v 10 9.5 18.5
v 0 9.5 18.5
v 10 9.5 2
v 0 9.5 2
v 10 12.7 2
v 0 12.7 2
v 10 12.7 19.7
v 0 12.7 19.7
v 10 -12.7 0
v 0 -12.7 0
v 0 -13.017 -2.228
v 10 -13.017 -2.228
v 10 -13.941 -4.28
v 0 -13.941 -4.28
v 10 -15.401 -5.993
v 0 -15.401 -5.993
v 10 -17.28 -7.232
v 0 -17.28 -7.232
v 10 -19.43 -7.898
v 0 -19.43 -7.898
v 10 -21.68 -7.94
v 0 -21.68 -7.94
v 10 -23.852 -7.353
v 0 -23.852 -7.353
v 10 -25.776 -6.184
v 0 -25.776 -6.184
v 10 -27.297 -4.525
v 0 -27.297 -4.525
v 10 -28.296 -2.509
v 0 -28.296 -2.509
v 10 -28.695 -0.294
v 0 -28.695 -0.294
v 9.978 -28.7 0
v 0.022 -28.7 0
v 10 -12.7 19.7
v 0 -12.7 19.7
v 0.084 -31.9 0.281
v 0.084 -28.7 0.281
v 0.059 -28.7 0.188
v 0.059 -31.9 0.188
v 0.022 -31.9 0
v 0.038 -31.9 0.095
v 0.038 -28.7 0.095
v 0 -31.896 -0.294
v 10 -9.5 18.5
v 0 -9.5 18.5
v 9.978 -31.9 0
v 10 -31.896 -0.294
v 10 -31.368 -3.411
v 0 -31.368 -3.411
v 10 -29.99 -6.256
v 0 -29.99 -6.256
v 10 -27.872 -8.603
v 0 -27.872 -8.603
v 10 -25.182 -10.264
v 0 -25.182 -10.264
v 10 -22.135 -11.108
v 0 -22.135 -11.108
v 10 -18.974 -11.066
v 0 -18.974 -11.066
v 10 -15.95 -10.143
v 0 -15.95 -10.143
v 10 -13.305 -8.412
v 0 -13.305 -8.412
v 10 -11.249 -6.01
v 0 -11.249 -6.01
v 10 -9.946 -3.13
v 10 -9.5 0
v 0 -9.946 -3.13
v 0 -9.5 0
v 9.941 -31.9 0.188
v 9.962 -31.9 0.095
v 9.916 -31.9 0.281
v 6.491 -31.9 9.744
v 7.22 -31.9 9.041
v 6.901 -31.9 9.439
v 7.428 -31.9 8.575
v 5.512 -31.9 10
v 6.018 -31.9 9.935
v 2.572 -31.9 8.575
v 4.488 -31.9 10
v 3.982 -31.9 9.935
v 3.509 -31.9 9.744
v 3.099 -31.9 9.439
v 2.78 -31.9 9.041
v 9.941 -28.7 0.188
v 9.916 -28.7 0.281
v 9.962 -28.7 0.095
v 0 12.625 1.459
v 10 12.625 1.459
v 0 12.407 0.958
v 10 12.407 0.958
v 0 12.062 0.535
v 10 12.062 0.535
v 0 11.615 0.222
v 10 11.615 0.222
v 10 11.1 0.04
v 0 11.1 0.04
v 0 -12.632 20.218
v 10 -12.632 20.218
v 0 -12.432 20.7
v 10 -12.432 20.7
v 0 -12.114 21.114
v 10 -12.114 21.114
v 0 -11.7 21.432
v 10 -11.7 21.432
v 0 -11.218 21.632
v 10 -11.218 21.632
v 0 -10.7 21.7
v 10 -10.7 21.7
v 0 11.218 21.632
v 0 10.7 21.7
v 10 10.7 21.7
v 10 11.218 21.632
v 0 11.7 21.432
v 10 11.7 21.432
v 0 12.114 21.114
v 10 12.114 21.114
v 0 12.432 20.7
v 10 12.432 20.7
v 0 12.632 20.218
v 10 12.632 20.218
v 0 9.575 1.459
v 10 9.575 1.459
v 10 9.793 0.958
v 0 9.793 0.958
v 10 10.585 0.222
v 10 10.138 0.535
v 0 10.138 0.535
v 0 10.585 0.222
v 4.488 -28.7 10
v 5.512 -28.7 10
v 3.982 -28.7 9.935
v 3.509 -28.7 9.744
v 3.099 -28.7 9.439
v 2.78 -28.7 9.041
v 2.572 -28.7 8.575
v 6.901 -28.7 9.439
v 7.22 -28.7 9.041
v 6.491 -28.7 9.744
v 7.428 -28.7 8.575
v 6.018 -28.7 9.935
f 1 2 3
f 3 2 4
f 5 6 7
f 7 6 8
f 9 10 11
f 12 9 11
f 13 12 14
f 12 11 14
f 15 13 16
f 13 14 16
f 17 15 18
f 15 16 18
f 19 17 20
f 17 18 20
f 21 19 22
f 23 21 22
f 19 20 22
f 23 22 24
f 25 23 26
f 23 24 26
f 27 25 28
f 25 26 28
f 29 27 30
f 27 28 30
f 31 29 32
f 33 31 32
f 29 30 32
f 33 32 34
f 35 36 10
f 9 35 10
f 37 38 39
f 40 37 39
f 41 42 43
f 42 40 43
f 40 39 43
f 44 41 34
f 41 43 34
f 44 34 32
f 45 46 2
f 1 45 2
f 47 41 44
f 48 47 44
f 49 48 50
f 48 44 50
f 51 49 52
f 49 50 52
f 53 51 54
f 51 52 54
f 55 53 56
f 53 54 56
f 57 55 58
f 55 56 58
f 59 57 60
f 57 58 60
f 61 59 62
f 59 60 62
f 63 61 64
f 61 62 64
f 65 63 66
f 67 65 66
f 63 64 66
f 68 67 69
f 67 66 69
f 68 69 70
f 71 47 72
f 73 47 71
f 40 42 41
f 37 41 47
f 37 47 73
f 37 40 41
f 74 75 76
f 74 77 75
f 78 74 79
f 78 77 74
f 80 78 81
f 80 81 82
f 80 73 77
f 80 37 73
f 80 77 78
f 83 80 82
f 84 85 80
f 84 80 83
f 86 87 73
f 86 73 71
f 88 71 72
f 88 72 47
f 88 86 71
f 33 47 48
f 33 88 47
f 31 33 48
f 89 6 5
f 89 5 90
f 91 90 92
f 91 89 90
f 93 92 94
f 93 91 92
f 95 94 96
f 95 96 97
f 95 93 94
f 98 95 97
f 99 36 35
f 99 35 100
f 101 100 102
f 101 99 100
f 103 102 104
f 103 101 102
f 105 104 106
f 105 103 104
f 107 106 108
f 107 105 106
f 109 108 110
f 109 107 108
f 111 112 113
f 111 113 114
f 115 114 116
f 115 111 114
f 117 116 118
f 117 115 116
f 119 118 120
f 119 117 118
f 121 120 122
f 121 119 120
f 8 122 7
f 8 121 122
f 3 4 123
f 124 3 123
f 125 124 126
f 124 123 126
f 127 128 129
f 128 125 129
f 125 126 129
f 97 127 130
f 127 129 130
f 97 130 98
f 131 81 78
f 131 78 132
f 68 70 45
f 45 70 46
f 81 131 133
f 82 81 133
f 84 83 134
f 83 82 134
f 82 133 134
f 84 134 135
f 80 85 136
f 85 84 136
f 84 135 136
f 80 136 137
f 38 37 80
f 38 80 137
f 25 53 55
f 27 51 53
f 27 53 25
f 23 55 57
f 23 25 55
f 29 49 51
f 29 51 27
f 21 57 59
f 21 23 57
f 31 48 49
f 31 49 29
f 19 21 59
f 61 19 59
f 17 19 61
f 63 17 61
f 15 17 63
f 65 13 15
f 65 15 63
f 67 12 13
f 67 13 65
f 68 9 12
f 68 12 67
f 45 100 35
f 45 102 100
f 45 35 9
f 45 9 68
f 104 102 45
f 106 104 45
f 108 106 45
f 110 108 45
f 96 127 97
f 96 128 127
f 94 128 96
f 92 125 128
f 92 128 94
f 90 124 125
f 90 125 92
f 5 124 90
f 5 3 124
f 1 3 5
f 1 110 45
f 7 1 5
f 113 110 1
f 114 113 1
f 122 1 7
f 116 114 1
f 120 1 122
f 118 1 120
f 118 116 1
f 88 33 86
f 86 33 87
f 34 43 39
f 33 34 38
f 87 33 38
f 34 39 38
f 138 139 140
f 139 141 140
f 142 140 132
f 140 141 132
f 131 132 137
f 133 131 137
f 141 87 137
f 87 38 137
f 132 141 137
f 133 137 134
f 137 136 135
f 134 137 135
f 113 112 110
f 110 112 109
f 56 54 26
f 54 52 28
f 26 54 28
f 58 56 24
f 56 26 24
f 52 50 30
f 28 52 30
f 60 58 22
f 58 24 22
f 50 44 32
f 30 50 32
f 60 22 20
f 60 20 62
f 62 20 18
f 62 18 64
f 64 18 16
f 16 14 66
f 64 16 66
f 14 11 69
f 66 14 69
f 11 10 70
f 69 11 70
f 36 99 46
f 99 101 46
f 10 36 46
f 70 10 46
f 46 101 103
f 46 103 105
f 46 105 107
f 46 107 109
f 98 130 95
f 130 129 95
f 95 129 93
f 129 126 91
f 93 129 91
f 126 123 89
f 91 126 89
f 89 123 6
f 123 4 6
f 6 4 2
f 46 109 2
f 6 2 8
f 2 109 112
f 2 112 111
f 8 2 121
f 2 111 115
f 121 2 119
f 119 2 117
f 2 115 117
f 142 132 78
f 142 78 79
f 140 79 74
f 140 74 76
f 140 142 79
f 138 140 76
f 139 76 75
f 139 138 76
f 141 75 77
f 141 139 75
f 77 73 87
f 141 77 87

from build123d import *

# Parameters (mm, degrees)
F0_W        = 3.2
F0_H        = 10
F1_DEPTH    = 10
F2_SIZE2    = 10
F2_SIZE     = 3
F3_T1_DEPTH = 10.6403065089
F3_T3_DEPTH = 4.667688363
F3_T5_DEPTH = 20


# Not quite as in the source:
# - a fillet or chamfer that OpenCascade refuses, or shapes differently, is made with other operations: its cross-section is extruded or revolved along the edge and cut away or added


with BuildPart() as f1:
    # F0 (on Right) → F1 (new body)
    with BuildSketch(Plane.YZ):
        with Locations((-30.3, 5)):
            Rectangle(F0_W, F0_H)
        with BuildLine():
            Line((-9.5, 0), (-12.7, 0))
            ThreePointArc((-12.7, 0), (-20.7, -8), (-28.7, 0))
            Line((-28.7, 0), (-31.9, 0))
            ThreePointArc((-31.9, 0), (-20.7, -11.2), (-9.5, 0))
        make_face()
        Polygon((-12.7, 21.7), (-12.7, 0), (-9.5, 0), (-9.5, 18.5), (9.5, 18.5), (9.5, 0), (12.7, 0), (12.7, 21.7), align=None)
    extrude(amount=F1_DEPTH)

    # F2
    f2_edges = [f1.edges().sort_by_distance(p)[0] for p in [
        (10, -30.3, 10),
        (0, -30.3, 10),
    ]]
    f2_side = f1.faces().sort_by_distance((5, -30.3, 10))[0]
    chamfer(f2_edges, length=F2_SIZE, length2=F2_SIZE2, reference=f2_side)

    # F3: fillet of radius 2 on 8 edges, made by hand

    # F3_s2 → F3_t1 (cut)
    with BuildSketch(Plane.XZ.offset(24.9798467455)):
        with BuildLine():
            ThreePointArc((5.5119386982, 10), (6.7057997575, 9.6045858566), (7.4275912687, 8.5746957711))
            Line((7.4275912687, 8.5746957711), (7, 10))
            Line((7, 10), (5.5119386982, 10))
        make_face()
        with BuildLine():
            ThreePointArc((4.4880613018, 10), (3.2942002425, 9.6045858566), (2.5724087313, 8.5746957711))
            Line((2.5724087313, 8.5746957711), (3, 10))
            Line((3, 10), (4.4880613018, 10))
        make_face()
    extrude(amount=F3_T1_DEPTH, mode=Mode.SUBTRACT)

    # F3_s4 → F3_t3 (cut)
    with BuildSketch(Plane.XZ.offset(27.9661558185)):
        with BuildLine():
            ThreePointArc((9.9156525704, 0.2811580985), (9.978800791, -0.0031113832), (10, -0.2935376726))
            Line((10, -0.2935376726), (10, 0))
            Line((10, 0), (9.9156525704, 0.2811580985))
        make_face()
        with BuildLine():
            ThreePointArc((0.0843474296, 0.2811580985), (0.021199209, -0.0031113832), (0, -0.2935376726))
            Line((0, -0.2935376726), (0, 0))
            Line((0, 0), (0.0843474296, 0.2811580985))
        make_face()
    extrude(amount=F3_T3_DEPTH, mode=Mode.SUBTRACT)

    # F3_s6 → F3_t5 (cut)
    with BuildSketch(Plane.YZ.offset(-5)):
        with BuildLine():
            ThreePointArc((-12.7, 19.7), (-12.1142135624, 21.1142135624), (-10.7, 21.7))
            Line((-10.7, 21.7), (-12.7, 21.7))
            Line((-12.7, 21.7), (-12.7, 19.7))
        make_face()
        with BuildLine():
            ThreePointArc((10.7, 21.7), (12.1142135624, 21.1142135624), (12.7, 19.7))
            Line((12.7, 19.7), (12.7, 21.7))
            Line((12.7, 21.7), (10.7, 21.7))
        make_face()
        with BuildLine():
            ThreePointArc((9.5, 2), (10.0857864376, 0.5857864376), (11.5, 0))
            Line((11.5, 0), (9.5, 0))
            Line((9.5, 0), (9.5, 2))
        make_face()
        with BuildLine():
            ThreePointArc((12.7, 2), (12.1142135624, 0.5857864376), (10.7, 0))
            Line((10.7, 0), (12.7, 0))
            Line((12.7, 0), (12.7, 2))
        make_face()
    extrude(amount=F3_T5_DEPTH, mode=Mode.SUBTRACT)


solid = f1.part
